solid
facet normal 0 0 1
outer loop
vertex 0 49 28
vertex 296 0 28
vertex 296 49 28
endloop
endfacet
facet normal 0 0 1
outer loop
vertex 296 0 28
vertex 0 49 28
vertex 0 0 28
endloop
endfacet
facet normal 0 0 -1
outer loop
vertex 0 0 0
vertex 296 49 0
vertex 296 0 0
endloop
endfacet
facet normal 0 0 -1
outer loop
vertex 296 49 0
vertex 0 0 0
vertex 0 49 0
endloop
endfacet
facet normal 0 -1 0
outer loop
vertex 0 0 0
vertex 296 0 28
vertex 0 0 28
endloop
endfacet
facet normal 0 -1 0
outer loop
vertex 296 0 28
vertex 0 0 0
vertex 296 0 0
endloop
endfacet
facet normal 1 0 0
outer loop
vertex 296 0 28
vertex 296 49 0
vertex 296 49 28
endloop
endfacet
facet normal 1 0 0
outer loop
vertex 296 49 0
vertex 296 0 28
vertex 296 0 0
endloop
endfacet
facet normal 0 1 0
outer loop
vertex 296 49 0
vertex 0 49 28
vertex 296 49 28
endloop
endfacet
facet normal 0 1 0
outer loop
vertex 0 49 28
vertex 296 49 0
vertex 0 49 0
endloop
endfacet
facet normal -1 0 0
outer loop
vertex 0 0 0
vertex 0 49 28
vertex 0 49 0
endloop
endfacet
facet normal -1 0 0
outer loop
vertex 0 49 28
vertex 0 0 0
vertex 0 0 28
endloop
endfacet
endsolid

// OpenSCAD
include <../src/wardrobe.scad>;
plank_zy_middle();
//github_openscad -o wardrobe_3/plank_zy_middle.stl -D wardrobe_n=3 -D cutting_edge=0 -D break_view_length=0 wardrobe_3/plank_zy_middle_stl.scad
